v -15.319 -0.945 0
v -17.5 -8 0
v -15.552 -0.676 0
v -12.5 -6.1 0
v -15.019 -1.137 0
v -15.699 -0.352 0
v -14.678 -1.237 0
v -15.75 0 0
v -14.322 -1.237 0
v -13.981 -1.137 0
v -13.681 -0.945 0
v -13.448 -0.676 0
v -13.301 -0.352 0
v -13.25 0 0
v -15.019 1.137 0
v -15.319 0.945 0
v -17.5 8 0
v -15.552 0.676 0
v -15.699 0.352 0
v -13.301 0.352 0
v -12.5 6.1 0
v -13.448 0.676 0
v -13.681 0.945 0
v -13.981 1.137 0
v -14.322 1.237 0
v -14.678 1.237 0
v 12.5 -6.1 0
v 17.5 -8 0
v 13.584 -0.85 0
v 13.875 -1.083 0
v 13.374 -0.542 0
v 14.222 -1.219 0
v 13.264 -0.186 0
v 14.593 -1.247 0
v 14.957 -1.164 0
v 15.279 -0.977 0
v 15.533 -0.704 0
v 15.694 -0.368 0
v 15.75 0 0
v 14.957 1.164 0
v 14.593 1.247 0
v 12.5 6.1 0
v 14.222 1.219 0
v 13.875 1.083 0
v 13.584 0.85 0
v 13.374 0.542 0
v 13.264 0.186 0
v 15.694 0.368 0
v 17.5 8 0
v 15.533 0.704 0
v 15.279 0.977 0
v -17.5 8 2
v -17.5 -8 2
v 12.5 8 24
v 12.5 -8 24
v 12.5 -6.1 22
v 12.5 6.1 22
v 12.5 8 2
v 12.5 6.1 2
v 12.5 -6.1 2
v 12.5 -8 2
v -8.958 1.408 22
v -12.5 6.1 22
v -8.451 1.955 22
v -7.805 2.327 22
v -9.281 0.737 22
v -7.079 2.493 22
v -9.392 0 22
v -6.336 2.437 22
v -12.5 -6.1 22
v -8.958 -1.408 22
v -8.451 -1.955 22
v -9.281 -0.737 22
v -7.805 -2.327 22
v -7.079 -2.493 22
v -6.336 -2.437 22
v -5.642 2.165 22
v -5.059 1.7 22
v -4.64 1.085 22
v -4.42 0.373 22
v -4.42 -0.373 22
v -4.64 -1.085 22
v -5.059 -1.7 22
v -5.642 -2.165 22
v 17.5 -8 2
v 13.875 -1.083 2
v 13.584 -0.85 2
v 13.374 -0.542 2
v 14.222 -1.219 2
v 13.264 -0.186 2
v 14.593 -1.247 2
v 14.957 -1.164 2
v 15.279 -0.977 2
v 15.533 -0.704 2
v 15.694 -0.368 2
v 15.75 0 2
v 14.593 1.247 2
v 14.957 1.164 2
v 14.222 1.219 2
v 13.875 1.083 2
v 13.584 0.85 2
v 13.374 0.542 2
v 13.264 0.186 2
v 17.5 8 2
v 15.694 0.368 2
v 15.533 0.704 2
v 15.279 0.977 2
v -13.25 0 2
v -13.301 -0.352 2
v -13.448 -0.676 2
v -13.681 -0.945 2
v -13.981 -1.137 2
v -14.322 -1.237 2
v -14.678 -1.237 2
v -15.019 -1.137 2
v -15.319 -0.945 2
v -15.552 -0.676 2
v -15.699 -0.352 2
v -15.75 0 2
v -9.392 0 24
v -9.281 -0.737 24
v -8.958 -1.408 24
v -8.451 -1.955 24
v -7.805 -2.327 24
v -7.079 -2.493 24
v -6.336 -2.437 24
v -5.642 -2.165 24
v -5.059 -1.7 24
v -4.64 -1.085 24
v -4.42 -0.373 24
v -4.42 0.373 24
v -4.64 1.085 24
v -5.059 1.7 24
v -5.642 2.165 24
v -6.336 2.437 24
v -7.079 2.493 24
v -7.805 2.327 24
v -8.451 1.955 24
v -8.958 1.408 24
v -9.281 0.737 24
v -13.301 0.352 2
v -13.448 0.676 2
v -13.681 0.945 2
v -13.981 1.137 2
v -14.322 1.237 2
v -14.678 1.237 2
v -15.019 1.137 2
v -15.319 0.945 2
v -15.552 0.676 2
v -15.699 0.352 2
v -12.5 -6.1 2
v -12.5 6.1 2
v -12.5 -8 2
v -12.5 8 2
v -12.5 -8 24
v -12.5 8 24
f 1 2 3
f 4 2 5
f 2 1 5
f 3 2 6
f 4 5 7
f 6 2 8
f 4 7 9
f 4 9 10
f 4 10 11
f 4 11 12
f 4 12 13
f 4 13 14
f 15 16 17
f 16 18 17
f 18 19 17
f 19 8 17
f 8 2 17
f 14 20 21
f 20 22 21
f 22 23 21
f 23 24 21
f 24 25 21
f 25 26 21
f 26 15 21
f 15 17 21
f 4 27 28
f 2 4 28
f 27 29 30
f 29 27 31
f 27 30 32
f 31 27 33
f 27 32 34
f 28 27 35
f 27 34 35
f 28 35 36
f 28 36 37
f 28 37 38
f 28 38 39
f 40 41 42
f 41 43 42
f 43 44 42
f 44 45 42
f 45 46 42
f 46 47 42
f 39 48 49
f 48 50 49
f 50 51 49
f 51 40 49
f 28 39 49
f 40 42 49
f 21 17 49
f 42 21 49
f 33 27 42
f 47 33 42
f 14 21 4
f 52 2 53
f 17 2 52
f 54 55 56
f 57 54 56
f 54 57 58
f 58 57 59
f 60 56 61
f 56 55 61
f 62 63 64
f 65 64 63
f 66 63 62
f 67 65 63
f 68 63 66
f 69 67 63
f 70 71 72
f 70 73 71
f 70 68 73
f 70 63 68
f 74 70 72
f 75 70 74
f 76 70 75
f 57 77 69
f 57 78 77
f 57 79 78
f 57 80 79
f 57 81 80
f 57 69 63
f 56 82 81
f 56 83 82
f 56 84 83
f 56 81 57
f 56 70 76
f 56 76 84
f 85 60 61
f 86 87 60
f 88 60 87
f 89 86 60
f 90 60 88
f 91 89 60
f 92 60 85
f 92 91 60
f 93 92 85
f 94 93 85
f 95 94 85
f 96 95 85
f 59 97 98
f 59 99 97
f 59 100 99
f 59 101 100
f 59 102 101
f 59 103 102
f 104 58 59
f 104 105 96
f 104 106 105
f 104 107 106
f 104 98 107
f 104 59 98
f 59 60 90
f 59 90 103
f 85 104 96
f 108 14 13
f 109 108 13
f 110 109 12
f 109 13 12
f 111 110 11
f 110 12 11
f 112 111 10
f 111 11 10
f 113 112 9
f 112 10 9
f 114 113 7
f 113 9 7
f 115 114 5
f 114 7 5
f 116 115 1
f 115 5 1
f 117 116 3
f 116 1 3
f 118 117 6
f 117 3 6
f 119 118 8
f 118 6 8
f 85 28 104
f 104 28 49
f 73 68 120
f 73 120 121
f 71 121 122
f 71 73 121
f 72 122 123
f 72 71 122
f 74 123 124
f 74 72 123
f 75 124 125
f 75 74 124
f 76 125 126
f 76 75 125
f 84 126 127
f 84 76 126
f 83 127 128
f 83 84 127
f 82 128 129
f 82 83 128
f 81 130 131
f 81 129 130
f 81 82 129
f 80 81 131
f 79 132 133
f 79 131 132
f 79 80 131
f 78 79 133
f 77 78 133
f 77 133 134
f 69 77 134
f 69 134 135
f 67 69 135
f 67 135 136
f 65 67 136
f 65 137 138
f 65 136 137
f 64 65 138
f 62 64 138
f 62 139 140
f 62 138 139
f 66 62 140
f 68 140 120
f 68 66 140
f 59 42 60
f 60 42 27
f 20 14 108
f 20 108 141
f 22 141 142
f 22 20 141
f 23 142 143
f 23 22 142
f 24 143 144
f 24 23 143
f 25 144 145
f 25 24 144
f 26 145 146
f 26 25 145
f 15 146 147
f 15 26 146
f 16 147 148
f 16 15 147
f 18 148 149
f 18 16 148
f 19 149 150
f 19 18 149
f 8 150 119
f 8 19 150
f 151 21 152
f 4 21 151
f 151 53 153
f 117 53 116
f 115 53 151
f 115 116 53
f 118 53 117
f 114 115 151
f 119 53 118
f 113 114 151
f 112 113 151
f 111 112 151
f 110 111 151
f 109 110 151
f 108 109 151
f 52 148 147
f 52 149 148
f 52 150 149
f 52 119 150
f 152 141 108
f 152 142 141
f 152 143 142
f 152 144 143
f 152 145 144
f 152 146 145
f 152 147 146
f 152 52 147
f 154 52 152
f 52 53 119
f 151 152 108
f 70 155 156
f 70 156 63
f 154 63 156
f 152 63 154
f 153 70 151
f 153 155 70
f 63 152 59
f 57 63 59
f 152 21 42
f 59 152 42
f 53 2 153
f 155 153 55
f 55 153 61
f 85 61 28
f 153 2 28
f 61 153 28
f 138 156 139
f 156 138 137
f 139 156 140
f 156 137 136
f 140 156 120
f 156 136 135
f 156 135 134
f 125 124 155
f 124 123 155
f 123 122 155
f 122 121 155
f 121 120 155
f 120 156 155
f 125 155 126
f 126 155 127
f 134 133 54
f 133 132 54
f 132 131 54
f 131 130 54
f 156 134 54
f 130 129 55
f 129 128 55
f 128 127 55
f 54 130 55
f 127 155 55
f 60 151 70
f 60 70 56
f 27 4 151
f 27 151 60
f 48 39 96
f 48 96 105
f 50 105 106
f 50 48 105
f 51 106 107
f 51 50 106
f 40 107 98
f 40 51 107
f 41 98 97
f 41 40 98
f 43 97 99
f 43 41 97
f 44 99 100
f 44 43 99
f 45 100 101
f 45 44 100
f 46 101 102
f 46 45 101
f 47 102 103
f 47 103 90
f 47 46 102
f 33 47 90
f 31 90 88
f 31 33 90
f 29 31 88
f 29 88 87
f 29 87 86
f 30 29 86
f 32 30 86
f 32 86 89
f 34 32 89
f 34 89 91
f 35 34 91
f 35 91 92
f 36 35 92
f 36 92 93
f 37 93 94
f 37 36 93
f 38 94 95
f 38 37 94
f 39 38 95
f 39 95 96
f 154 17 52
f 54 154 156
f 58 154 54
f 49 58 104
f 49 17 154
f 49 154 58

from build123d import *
from build123d.topology import SkipClean

# Parameters (mm, degrees)
BOSS_EXTRUDE1_DEPTH     = 2
MIRROR1_OUTLINE_R       = 1.25
MIRROR1_DEPTH           = 2
SKETCH2_W               = 25
SKETCH2_H               = 1.9
BOSS_EXTRUDE2_DEPTH     = 22
BOSS_EXTRUDE3_REACH     = 34.879
SKETCH3_W               = 25
SKETCH3_H               = 2
CUT_EXTRUDE1_DEPTH      = 31.761176831
CUT_EXTRUDE1_DEPTH_BACK = 3
SKETCH4_R               = 2.5


# Read off the part's stored shape, not the designer's step: Mirror1
with BuildPart() as part:
    # Sketch1 → Boss-Extrude1 (new body)
    with BuildSketch(Plane.XY):
        with BuildLine():
            Line((-17.5, 8), (0, 8))
            Line((0, 8), (0, 6.1))
            Line((0, 6.1), (-12.5, 6.1))
            Line((-12.5, 6.1), (-12.5, 0))
            Line((-12.5, 0), (-13.25, 0))
            ThreePointArc((-13.25, 0), (-14.5, 1.25), (-15.75, 0))
            Line((-15.75, 0), (-17.5, 0))
            Line((-17.5, 0), (-17.5, 8))
        make_face()
    extrude(amount=BOSS_EXTRUDE1_DEPTH)

    # Mirror1 outline → Mirror1 (add)
    with SkipClean():  # the faces are left unmerged after this step: merging them gives an invalid solid
        with BuildSketch(Plane.XY):
            with BuildLine():
                Line((17.5, 8), (0, 8))
                Line((0, 8), (0, 6.1))
                Line((0, 6.1), (12.5, 6.1))
                Line((12.5, 6.1), (12.5, -6.1))
                Line((12.5, -6.1), (-12.5, -6.1))
                Line((-12.5, -6.1), (-12.5, 0))
                Line((-12.5, 0), (-13.25, 0))
                ThreePointArc((-13.25, 0), (-14.5, -1.25), (-15.75, 0))
                Line((-15.75, 0), (-17.5, 0))
                Line((-17.5, 0), (-17.5, -8))
                Line((-17.5, -8), (17.5, -8))
                Line((17.5, -8), (17.5, 8))
            make_face()
            with Locations((14.5, 0)):
                Circle(MIRROR1_OUTLINE_R, mode=Mode.SUBTRACT)
        extrude(amount=MIRROR1_DEPTH)
    add(part.part.scale(1), mode=Mode.REPLACE)  # the faces are merged on a copy

    # Sketch2 → Boss-Extrude2 (add)
    with BuildSketch(Plane.XY.offset(2)):
        with Locations((0, 7.05)):
            Rectangle(SKETCH2_W, SKETCH2_H)
        with Locations((0, -7.05)):
            Rectangle(SKETCH2_W, SKETCH2_H)
    extrude(amount=BOSS_EXTRUDE2_DEPTH)

    # Sketch3 → Boss-Extrude3 (add, up to next)
    with BuildSketch(Plane(origin=(0, -6.1, 0), x_dir=(1, 0, 0), z_dir=(0, 1, 0)), mode=Mode.PRIVATE) as boss_extrude3_sk1:
        with Locations((0, -23)):
            Rectangle(SKETCH3_W, SKETCH3_H)
    boss_extrude3_tool1 = extrude(boss_extrude3_sk1.sketch, amount=BOSS_EXTRUDE3_REACH, mode=Mode.PRIVATE) - part.part
    add(boss_extrude3_tool1.solids().sort_by_distance((0, -6.1, 23))[0])

    # Sketch4 → Cut-Extrude1 (cut, two sides: drawn at the far end of the back side and taken through both)
    with BuildSketch(Plane.XY.offset(24).offset(-CUT_EXTRUDE1_DEPTH_BACK)):
        with Locations(Location((-6.892107872, 0, 0), (0, 0, 180))):
            Circle(SKETCH4_R)
    extrude(amount=CUT_EXTRUDE1_DEPTH + CUT_EXTRUDE1_DEPTH_BACK, mode=Mode.SUBTRACT)


solid = part.part
